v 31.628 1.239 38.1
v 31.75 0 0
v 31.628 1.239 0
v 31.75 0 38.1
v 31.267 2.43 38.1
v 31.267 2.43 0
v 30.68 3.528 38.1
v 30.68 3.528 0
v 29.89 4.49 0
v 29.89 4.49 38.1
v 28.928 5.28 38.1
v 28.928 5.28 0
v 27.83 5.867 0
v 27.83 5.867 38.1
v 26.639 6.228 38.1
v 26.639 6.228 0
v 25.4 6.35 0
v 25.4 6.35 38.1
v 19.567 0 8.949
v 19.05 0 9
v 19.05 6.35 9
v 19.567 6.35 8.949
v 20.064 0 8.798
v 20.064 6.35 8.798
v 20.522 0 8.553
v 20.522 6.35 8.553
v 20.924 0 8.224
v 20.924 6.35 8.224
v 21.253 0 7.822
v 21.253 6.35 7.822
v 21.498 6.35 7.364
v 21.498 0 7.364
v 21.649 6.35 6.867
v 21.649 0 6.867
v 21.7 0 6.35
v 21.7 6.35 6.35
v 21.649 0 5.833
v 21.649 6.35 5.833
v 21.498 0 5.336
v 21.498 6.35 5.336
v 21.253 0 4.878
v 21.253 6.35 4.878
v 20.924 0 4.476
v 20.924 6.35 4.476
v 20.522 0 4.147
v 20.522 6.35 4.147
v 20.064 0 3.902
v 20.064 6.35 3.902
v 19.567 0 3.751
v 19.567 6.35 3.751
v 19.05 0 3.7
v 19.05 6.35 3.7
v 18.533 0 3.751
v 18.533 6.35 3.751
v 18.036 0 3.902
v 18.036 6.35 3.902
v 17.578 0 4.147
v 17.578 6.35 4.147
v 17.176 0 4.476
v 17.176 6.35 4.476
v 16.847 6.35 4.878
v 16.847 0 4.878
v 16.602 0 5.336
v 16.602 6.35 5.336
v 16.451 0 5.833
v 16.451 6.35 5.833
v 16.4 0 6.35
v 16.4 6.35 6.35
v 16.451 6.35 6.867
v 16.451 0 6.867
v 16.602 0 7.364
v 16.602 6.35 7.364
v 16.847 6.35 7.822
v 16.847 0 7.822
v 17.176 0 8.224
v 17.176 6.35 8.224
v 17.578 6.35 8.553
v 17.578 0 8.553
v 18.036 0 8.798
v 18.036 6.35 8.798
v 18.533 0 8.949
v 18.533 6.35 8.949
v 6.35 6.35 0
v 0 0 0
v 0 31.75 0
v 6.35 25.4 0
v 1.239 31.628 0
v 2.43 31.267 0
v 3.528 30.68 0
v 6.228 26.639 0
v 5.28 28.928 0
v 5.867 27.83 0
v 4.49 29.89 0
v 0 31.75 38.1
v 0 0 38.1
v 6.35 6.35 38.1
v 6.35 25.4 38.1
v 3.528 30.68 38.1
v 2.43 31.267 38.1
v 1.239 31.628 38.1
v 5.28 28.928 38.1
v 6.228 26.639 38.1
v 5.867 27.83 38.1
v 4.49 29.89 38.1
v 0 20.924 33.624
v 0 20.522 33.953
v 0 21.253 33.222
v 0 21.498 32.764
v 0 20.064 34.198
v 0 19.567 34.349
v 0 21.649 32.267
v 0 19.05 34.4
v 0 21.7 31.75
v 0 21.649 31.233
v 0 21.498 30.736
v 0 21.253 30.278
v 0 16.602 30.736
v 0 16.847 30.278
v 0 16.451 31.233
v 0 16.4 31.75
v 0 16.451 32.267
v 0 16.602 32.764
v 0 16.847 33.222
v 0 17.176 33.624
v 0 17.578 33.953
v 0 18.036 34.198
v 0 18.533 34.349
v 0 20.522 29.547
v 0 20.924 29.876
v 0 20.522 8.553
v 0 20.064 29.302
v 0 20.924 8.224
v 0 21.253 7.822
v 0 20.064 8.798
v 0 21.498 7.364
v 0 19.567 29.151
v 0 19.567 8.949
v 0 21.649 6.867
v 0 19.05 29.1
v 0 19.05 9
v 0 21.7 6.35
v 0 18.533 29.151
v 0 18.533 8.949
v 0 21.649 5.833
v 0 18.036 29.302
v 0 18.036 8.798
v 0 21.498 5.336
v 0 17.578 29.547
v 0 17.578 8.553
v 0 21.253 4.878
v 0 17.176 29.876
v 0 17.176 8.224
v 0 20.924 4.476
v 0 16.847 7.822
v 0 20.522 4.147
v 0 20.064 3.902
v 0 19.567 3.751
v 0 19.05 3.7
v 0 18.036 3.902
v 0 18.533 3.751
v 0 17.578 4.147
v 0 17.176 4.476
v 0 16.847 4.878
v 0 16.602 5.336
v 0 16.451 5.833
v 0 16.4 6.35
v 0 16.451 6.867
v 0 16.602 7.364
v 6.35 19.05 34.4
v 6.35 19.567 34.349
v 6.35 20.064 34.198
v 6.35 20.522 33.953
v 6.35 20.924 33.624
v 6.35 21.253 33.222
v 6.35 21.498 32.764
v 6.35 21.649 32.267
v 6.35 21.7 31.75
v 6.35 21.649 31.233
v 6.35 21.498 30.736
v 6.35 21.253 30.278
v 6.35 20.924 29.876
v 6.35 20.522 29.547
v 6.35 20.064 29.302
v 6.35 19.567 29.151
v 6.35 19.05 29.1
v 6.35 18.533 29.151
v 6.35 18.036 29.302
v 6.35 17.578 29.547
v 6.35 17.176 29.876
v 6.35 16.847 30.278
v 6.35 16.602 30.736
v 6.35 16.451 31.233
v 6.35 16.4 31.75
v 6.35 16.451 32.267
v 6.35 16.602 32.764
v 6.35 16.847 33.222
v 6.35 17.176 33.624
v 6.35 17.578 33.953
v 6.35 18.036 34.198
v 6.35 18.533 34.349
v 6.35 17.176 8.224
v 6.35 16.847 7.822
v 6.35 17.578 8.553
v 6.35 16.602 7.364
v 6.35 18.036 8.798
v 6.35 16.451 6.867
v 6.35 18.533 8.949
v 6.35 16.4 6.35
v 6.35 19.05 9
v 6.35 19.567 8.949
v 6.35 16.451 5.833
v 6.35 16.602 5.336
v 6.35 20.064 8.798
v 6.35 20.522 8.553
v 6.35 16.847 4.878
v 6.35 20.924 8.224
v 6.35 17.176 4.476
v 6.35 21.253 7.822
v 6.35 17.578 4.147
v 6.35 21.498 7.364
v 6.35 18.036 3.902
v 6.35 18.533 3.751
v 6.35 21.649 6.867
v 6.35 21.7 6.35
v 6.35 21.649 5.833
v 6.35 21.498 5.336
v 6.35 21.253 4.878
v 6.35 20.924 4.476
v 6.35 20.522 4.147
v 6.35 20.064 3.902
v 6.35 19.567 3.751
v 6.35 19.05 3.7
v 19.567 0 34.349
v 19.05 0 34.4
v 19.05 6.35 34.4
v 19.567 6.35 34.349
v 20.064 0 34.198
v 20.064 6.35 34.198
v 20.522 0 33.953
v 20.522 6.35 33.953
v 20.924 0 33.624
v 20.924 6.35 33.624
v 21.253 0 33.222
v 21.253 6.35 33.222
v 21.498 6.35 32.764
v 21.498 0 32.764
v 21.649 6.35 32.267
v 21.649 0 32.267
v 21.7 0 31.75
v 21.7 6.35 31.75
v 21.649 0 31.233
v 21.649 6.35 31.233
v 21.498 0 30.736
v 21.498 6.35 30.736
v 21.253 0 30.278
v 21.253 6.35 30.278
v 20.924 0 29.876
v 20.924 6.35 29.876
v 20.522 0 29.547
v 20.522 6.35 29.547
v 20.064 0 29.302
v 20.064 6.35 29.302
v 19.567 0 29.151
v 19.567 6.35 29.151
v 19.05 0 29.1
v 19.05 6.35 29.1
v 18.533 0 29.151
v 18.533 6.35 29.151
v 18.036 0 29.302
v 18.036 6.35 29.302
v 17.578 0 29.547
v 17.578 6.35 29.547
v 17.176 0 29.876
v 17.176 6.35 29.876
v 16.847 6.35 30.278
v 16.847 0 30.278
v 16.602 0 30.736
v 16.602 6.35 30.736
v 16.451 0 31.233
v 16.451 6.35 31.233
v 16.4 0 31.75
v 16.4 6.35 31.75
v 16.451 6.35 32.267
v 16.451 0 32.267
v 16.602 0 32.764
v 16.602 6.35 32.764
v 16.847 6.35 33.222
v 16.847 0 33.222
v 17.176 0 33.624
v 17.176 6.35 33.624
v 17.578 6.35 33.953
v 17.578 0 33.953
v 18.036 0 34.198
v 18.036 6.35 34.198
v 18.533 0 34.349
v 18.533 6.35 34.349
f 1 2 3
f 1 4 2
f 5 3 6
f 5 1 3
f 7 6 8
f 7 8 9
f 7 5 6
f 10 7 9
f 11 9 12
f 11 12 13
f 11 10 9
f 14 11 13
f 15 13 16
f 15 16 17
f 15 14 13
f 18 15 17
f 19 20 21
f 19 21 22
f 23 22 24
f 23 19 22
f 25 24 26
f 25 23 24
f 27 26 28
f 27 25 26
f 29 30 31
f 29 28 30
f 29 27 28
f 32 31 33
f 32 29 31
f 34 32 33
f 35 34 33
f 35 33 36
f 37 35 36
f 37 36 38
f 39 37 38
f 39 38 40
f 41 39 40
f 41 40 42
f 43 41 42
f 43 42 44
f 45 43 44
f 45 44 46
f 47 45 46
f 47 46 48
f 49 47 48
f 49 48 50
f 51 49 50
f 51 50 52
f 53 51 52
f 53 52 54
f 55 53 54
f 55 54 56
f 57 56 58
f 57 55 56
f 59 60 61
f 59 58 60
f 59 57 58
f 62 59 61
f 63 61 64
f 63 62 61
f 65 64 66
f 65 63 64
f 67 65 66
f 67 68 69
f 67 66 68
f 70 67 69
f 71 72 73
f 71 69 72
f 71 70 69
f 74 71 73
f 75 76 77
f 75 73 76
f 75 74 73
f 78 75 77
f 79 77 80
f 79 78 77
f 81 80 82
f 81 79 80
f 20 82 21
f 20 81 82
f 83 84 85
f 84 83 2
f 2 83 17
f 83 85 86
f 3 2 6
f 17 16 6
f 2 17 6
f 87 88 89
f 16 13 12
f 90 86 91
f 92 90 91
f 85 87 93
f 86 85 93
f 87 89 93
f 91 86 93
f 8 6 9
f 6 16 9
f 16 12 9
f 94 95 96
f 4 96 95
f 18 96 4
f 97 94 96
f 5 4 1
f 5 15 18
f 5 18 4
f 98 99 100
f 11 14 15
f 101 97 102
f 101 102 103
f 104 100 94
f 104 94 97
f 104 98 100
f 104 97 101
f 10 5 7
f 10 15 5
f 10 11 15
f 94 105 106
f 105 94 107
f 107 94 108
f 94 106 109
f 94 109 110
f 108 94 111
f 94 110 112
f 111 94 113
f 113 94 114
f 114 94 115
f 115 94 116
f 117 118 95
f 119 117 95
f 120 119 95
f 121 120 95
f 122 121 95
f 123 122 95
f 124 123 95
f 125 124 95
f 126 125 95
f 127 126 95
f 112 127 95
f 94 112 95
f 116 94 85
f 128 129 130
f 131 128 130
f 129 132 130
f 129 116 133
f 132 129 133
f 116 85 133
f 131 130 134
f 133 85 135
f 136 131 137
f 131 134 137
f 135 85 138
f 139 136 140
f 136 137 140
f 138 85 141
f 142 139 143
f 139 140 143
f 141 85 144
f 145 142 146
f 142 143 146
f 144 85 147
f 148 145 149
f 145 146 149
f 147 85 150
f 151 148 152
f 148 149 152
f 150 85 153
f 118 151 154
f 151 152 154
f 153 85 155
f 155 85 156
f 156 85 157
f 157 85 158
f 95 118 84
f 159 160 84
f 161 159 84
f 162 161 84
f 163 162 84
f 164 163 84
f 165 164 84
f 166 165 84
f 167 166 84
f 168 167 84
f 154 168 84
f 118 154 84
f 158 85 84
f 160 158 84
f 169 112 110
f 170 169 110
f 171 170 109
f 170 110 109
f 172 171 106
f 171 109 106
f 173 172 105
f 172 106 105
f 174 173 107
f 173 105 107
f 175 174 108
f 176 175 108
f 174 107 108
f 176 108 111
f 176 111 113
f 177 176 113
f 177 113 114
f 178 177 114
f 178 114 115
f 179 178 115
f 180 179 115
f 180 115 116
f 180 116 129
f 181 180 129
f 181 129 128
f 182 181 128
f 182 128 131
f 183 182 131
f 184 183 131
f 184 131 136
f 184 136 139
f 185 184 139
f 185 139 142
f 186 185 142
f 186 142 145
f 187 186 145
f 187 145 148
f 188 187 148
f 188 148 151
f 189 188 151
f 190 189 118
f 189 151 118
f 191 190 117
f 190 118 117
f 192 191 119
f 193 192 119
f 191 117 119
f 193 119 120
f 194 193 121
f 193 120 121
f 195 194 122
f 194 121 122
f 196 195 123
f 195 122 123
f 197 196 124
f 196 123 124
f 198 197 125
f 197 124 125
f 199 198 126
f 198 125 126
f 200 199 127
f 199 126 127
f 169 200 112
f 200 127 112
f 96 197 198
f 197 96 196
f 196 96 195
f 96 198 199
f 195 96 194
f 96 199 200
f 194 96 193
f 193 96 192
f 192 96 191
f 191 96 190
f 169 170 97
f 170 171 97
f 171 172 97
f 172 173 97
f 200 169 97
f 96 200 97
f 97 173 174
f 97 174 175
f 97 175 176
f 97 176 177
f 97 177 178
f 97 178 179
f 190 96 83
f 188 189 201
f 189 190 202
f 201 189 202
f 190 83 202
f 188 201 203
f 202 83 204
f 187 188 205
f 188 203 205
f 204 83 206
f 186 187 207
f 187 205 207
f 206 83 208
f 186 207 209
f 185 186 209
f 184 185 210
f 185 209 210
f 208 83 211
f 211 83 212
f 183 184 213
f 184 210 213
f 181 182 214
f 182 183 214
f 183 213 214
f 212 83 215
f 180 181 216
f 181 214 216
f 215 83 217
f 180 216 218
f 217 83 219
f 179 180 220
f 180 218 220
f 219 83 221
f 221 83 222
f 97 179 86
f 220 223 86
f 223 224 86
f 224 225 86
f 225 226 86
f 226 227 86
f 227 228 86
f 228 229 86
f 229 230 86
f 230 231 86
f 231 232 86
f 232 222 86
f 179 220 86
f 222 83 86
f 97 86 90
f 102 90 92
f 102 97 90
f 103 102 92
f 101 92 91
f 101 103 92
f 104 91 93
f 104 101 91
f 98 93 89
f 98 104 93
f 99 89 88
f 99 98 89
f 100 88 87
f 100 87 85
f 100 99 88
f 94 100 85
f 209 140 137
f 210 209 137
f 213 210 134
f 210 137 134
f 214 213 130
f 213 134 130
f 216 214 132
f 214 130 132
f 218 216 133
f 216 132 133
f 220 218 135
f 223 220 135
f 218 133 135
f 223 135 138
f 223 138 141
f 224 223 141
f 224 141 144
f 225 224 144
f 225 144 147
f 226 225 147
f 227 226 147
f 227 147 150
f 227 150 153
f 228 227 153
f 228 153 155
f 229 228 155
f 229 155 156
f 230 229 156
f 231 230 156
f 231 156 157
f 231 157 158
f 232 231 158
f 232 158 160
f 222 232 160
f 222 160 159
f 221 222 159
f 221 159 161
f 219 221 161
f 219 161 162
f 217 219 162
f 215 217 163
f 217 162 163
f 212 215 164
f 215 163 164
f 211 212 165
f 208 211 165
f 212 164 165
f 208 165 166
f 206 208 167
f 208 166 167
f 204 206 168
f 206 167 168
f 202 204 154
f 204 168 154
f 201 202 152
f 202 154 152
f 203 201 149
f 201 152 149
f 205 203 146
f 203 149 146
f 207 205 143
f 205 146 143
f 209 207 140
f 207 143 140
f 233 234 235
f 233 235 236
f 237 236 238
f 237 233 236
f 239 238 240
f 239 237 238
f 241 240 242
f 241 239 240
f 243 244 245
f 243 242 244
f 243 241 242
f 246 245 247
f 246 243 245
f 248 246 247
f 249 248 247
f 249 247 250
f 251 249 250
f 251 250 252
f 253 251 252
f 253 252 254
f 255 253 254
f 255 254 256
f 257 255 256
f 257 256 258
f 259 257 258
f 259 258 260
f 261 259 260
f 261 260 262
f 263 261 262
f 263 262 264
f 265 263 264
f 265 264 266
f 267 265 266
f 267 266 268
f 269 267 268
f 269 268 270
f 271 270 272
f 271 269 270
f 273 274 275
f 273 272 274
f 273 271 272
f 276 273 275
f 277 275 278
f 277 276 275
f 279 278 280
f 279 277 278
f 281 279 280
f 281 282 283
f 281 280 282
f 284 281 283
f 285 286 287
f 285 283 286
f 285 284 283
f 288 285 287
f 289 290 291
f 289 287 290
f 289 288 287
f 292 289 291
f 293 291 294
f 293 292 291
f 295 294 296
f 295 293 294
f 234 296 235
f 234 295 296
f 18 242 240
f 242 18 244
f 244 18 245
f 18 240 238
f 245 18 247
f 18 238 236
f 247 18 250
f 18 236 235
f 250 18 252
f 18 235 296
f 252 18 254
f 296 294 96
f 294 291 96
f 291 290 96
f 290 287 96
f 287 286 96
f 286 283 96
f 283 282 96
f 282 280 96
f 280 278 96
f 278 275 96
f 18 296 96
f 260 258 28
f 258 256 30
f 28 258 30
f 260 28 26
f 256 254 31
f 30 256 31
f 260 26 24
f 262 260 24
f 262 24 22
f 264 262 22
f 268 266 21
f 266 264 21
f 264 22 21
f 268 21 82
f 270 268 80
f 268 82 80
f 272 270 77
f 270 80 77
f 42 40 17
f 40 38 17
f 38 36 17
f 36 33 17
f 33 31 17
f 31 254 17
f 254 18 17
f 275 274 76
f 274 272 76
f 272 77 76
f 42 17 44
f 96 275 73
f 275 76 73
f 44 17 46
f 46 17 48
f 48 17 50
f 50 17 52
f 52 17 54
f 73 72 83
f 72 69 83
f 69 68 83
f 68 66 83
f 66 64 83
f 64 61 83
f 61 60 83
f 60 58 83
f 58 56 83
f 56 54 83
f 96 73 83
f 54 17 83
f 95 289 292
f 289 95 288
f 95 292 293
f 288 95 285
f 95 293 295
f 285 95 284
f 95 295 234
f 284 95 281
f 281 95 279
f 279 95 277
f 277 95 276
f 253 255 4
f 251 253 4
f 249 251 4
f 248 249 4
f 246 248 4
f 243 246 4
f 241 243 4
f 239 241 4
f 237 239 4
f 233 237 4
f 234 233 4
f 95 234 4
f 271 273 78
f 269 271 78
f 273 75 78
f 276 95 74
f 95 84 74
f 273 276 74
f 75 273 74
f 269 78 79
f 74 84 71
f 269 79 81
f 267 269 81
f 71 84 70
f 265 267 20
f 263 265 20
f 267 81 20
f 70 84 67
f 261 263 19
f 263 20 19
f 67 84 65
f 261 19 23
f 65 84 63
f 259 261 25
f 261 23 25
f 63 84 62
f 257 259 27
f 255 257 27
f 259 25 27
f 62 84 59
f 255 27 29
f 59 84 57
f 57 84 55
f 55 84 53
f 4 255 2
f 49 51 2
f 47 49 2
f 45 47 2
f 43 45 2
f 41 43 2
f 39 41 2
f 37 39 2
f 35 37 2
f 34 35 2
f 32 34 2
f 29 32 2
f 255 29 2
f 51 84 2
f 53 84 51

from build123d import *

# Parameters (mm, degrees)
BOSS_EXTRUDE1_DEPTH  = 38.1
FILLET1_R            = 6.35
M5_CLEARANCE_HOLE1_D = 5.3


with BuildPart() as part:
    # Sketch1 → Boss-Extrude1 (new body)
    with BuildSketch(Plane.XY):
        Polygon((0, 0), (31.75, 0), (31.75, 6.35), (6.35, 6.35), (6.35, 31.75), (0, 31.75), align=None)
    extrude(amount=BOSS_EXTRUDE1_DEPTH)

    # Fillet1
    fillet1_edges = [part.edges().sort_by_distance(p)[0] for p in [
        (31.75, 6.35, 19.05),
        (6.35, 31.75, 19.05),
    ]]
    fillet(fillet1_edges, radius=FILLET1_R - 0.0001)  # a hair under: the kernel refuses the full size

    # M5 Clearance Hole1 (through all)
    with Locations(Plane(origin=(6.35, 0, 0), x_dir=(0, 0, -1), z_dir=(1, 0, 0))):
        with Locations((-31.75, 19.05), (-6.35, 19.05)):
            m5_clearance_hole1 = Hole(M5_CLEARANCE_HOLE1_D / 2)

    # Mirror1: M5 Clearance Hole1 across plane
    add(m5_clearance_hole1.mirror(Plane(origin=(0, 0, 0), x_dir=(0, 0, 1), z_dir=(-0.7071067811865472, 0.7071067811865479, 0))), mode=Mode.SUBTRACT)


solid = part.part
